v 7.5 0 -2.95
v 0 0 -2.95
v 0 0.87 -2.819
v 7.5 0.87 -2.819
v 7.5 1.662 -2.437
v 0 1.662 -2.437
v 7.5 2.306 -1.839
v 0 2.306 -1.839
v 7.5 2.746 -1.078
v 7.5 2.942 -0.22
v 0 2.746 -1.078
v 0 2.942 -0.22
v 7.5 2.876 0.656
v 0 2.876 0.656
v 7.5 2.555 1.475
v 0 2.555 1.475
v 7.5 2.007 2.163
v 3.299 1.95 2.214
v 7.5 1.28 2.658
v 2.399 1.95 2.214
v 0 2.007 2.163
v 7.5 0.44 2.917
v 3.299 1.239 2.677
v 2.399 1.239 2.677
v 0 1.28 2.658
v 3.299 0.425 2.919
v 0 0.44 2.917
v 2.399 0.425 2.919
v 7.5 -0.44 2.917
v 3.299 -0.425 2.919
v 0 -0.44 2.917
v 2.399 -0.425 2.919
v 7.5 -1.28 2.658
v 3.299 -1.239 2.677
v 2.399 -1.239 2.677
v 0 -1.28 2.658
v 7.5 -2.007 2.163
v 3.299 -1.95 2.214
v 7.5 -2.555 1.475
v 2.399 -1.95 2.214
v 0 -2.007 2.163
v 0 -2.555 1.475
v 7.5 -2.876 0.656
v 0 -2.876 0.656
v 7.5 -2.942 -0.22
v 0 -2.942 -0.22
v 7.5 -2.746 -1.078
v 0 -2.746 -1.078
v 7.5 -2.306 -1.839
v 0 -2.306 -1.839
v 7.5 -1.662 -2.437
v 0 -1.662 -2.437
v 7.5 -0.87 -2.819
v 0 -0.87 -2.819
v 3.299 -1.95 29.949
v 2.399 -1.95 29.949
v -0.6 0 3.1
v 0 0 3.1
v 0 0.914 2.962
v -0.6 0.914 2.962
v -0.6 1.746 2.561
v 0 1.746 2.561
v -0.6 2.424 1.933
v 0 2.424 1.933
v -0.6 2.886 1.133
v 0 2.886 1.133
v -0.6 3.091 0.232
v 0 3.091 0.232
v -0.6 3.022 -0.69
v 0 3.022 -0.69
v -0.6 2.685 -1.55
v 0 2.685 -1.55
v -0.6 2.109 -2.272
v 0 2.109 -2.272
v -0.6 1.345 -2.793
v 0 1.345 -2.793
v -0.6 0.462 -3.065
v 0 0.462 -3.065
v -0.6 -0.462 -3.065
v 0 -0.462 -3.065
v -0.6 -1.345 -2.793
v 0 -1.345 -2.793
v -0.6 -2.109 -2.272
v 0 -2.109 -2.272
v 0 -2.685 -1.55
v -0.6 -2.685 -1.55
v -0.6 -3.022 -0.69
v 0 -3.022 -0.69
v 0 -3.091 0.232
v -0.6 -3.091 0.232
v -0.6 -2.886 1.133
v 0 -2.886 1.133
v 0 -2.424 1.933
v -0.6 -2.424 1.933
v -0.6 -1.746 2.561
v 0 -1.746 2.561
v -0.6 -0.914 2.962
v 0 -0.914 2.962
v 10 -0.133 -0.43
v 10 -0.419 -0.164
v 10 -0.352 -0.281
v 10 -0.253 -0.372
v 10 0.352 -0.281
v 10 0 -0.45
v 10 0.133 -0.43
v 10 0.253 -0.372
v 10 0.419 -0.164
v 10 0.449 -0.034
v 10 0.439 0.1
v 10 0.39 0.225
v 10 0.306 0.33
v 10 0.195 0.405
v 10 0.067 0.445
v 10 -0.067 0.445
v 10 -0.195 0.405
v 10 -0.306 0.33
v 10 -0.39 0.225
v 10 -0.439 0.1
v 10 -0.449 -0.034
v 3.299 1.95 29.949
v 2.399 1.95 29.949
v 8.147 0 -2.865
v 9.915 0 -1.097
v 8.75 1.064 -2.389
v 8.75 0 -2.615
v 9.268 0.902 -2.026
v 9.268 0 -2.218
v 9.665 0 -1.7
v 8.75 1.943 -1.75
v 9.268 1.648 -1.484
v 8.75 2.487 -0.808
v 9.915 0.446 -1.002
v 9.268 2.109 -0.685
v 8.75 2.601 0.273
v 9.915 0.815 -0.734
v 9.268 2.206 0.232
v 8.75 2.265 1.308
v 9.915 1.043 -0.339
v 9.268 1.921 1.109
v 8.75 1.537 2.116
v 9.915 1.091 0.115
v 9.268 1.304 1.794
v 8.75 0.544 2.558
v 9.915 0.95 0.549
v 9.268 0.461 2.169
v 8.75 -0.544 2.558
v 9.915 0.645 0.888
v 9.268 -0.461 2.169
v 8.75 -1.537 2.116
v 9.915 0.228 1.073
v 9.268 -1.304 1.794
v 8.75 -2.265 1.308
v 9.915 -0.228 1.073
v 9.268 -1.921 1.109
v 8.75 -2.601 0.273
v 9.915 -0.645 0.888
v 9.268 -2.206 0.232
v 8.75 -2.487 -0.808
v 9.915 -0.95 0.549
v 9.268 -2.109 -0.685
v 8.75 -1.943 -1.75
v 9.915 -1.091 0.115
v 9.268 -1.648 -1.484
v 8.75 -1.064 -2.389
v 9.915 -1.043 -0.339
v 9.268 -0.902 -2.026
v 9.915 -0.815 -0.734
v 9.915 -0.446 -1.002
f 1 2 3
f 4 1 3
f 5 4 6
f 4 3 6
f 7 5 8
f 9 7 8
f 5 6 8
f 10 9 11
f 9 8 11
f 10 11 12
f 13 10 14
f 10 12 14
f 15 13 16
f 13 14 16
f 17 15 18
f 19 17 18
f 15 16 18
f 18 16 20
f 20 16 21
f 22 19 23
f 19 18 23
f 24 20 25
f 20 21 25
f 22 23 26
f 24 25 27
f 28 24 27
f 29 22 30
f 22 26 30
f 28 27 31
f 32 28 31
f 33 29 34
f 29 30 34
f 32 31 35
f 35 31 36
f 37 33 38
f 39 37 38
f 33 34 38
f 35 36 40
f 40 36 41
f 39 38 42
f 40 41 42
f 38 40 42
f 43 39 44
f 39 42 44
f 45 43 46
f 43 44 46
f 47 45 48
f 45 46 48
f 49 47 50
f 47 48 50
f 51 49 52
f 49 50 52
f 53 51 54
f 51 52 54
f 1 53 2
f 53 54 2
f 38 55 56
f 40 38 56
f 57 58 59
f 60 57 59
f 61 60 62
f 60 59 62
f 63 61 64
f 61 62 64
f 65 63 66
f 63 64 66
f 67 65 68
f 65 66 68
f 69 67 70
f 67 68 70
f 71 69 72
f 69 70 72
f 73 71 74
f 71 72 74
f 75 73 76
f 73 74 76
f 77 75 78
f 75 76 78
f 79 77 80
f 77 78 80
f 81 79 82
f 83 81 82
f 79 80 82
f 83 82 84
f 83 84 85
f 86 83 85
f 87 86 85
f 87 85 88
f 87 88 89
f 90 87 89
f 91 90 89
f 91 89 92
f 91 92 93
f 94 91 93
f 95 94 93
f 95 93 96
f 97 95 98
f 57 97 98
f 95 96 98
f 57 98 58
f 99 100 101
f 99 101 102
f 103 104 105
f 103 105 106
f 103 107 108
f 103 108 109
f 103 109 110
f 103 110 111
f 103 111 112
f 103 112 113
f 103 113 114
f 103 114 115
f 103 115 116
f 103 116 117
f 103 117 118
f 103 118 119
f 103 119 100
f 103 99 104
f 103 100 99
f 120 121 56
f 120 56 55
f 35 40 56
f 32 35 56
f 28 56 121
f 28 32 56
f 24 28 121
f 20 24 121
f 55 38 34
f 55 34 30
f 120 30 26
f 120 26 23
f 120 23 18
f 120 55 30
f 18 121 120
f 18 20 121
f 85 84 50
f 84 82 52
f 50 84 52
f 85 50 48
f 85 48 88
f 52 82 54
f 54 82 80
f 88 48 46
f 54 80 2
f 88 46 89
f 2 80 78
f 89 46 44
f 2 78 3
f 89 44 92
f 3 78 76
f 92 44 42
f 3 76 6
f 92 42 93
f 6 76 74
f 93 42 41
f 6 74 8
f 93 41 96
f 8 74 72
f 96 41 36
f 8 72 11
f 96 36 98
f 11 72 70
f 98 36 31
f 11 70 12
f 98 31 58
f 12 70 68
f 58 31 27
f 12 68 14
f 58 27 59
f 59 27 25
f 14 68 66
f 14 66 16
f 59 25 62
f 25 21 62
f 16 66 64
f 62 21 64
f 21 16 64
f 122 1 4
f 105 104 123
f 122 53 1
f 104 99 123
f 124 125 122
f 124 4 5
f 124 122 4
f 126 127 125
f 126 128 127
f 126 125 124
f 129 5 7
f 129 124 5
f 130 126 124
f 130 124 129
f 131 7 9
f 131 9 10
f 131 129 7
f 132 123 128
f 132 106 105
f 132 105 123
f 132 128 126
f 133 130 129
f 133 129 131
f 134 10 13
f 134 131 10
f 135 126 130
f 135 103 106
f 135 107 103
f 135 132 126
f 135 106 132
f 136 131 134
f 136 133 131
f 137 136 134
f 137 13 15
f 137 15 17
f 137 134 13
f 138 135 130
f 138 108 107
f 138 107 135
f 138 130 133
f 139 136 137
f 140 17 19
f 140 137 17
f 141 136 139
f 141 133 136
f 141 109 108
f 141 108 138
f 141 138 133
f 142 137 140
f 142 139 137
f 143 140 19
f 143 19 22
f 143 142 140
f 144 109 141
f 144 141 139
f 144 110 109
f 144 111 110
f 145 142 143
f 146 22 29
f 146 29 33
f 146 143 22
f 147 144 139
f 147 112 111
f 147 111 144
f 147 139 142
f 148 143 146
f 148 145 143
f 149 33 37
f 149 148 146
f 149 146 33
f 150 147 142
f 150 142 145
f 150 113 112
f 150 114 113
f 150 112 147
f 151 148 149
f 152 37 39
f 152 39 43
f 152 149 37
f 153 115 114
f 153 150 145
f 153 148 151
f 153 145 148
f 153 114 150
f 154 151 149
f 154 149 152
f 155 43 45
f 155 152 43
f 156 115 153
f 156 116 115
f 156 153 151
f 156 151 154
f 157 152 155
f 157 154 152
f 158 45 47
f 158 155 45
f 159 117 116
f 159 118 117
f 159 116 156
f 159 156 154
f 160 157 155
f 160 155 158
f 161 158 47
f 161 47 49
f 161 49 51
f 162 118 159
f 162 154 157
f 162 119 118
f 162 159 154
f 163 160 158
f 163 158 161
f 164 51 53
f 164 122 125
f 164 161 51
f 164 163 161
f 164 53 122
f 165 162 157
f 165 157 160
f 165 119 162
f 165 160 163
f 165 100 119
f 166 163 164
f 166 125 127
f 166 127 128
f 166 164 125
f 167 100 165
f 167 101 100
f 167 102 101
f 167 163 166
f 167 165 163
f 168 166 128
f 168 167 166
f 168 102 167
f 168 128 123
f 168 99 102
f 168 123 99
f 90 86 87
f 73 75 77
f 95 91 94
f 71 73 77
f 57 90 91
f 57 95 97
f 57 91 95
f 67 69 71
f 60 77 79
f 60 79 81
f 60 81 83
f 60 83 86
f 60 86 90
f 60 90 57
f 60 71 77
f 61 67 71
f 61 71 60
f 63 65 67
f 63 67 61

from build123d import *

# Parameters (mm, degrees)
CROQUIS1_R              = 2.95
SALIENTE_EXTRUIR1_DEPTH = 10
REDONDEO1_R             = 2.5
CROQUIS2_R              = 3.1
SALIENTE_EXTRUIR2_DEPTH = 0.6
CROQUIS5_W              = 0.9
CROQUIS5_H              = 3.9
SALIENTE_EXTRUIR4_DEPTH = 27
CROQUIS8_W              = 0.9
CROQUIS8_H              = 3.9
SALIENTE_EXTRUIR5_DEPTH = 2


with BuildPart() as part:
    # Croquis1 → Saliente-Extruir1 (new body)
    with BuildSketch(Plane(origin=(0, 0, 0), x_dir=(0, 0, -1), z_dir=(1, 0, 0))):
        Circle(CROQUIS1_R)
    extrude(amount=SALIENTE_EXTRUIR1_DEPTH)

    # Redondeo1
    redondeo1_edges = [part.edges().sort_by_distance(p)[0] for p in [
        (10, 0, 2.95),
    ]]
    fillet(redondeo1_edges, radius=REDONDEO1_R)

    # Croquis2 → Saliente-Extruir2 (add)
    with BuildSketch(Plane.ZY):
        Circle(CROQUIS2_R)
    extrude(amount=SALIENTE_EXTRUIR2_DEPTH)

    # Croquis5 → Saliente-Extruir4 (add)
    with BuildSketch(Plane.XY.offset(2.949336532)):
        with Locations((2.848707903, 0)):
            Rectangle(CROQUIS5_W, CROQUIS5_H)
    extrude(amount=SALIENTE_EXTRUIR4_DEPTH)

    # Croquis8 → Saliente-Extruir5 (add)
    with BuildSketch(Plane(origin=(0, 0, 2.949336532), x_dir=(-1, 0, 0), z_dir=(0, 0, -1))):
        with Locations((-2.848707903, 0)):
            Rectangle(CROQUIS8_W, CROQUIS8_H)
    extrude(amount=SALIENTE_EXTRUIR5_DEPTH)


solid = part.part
